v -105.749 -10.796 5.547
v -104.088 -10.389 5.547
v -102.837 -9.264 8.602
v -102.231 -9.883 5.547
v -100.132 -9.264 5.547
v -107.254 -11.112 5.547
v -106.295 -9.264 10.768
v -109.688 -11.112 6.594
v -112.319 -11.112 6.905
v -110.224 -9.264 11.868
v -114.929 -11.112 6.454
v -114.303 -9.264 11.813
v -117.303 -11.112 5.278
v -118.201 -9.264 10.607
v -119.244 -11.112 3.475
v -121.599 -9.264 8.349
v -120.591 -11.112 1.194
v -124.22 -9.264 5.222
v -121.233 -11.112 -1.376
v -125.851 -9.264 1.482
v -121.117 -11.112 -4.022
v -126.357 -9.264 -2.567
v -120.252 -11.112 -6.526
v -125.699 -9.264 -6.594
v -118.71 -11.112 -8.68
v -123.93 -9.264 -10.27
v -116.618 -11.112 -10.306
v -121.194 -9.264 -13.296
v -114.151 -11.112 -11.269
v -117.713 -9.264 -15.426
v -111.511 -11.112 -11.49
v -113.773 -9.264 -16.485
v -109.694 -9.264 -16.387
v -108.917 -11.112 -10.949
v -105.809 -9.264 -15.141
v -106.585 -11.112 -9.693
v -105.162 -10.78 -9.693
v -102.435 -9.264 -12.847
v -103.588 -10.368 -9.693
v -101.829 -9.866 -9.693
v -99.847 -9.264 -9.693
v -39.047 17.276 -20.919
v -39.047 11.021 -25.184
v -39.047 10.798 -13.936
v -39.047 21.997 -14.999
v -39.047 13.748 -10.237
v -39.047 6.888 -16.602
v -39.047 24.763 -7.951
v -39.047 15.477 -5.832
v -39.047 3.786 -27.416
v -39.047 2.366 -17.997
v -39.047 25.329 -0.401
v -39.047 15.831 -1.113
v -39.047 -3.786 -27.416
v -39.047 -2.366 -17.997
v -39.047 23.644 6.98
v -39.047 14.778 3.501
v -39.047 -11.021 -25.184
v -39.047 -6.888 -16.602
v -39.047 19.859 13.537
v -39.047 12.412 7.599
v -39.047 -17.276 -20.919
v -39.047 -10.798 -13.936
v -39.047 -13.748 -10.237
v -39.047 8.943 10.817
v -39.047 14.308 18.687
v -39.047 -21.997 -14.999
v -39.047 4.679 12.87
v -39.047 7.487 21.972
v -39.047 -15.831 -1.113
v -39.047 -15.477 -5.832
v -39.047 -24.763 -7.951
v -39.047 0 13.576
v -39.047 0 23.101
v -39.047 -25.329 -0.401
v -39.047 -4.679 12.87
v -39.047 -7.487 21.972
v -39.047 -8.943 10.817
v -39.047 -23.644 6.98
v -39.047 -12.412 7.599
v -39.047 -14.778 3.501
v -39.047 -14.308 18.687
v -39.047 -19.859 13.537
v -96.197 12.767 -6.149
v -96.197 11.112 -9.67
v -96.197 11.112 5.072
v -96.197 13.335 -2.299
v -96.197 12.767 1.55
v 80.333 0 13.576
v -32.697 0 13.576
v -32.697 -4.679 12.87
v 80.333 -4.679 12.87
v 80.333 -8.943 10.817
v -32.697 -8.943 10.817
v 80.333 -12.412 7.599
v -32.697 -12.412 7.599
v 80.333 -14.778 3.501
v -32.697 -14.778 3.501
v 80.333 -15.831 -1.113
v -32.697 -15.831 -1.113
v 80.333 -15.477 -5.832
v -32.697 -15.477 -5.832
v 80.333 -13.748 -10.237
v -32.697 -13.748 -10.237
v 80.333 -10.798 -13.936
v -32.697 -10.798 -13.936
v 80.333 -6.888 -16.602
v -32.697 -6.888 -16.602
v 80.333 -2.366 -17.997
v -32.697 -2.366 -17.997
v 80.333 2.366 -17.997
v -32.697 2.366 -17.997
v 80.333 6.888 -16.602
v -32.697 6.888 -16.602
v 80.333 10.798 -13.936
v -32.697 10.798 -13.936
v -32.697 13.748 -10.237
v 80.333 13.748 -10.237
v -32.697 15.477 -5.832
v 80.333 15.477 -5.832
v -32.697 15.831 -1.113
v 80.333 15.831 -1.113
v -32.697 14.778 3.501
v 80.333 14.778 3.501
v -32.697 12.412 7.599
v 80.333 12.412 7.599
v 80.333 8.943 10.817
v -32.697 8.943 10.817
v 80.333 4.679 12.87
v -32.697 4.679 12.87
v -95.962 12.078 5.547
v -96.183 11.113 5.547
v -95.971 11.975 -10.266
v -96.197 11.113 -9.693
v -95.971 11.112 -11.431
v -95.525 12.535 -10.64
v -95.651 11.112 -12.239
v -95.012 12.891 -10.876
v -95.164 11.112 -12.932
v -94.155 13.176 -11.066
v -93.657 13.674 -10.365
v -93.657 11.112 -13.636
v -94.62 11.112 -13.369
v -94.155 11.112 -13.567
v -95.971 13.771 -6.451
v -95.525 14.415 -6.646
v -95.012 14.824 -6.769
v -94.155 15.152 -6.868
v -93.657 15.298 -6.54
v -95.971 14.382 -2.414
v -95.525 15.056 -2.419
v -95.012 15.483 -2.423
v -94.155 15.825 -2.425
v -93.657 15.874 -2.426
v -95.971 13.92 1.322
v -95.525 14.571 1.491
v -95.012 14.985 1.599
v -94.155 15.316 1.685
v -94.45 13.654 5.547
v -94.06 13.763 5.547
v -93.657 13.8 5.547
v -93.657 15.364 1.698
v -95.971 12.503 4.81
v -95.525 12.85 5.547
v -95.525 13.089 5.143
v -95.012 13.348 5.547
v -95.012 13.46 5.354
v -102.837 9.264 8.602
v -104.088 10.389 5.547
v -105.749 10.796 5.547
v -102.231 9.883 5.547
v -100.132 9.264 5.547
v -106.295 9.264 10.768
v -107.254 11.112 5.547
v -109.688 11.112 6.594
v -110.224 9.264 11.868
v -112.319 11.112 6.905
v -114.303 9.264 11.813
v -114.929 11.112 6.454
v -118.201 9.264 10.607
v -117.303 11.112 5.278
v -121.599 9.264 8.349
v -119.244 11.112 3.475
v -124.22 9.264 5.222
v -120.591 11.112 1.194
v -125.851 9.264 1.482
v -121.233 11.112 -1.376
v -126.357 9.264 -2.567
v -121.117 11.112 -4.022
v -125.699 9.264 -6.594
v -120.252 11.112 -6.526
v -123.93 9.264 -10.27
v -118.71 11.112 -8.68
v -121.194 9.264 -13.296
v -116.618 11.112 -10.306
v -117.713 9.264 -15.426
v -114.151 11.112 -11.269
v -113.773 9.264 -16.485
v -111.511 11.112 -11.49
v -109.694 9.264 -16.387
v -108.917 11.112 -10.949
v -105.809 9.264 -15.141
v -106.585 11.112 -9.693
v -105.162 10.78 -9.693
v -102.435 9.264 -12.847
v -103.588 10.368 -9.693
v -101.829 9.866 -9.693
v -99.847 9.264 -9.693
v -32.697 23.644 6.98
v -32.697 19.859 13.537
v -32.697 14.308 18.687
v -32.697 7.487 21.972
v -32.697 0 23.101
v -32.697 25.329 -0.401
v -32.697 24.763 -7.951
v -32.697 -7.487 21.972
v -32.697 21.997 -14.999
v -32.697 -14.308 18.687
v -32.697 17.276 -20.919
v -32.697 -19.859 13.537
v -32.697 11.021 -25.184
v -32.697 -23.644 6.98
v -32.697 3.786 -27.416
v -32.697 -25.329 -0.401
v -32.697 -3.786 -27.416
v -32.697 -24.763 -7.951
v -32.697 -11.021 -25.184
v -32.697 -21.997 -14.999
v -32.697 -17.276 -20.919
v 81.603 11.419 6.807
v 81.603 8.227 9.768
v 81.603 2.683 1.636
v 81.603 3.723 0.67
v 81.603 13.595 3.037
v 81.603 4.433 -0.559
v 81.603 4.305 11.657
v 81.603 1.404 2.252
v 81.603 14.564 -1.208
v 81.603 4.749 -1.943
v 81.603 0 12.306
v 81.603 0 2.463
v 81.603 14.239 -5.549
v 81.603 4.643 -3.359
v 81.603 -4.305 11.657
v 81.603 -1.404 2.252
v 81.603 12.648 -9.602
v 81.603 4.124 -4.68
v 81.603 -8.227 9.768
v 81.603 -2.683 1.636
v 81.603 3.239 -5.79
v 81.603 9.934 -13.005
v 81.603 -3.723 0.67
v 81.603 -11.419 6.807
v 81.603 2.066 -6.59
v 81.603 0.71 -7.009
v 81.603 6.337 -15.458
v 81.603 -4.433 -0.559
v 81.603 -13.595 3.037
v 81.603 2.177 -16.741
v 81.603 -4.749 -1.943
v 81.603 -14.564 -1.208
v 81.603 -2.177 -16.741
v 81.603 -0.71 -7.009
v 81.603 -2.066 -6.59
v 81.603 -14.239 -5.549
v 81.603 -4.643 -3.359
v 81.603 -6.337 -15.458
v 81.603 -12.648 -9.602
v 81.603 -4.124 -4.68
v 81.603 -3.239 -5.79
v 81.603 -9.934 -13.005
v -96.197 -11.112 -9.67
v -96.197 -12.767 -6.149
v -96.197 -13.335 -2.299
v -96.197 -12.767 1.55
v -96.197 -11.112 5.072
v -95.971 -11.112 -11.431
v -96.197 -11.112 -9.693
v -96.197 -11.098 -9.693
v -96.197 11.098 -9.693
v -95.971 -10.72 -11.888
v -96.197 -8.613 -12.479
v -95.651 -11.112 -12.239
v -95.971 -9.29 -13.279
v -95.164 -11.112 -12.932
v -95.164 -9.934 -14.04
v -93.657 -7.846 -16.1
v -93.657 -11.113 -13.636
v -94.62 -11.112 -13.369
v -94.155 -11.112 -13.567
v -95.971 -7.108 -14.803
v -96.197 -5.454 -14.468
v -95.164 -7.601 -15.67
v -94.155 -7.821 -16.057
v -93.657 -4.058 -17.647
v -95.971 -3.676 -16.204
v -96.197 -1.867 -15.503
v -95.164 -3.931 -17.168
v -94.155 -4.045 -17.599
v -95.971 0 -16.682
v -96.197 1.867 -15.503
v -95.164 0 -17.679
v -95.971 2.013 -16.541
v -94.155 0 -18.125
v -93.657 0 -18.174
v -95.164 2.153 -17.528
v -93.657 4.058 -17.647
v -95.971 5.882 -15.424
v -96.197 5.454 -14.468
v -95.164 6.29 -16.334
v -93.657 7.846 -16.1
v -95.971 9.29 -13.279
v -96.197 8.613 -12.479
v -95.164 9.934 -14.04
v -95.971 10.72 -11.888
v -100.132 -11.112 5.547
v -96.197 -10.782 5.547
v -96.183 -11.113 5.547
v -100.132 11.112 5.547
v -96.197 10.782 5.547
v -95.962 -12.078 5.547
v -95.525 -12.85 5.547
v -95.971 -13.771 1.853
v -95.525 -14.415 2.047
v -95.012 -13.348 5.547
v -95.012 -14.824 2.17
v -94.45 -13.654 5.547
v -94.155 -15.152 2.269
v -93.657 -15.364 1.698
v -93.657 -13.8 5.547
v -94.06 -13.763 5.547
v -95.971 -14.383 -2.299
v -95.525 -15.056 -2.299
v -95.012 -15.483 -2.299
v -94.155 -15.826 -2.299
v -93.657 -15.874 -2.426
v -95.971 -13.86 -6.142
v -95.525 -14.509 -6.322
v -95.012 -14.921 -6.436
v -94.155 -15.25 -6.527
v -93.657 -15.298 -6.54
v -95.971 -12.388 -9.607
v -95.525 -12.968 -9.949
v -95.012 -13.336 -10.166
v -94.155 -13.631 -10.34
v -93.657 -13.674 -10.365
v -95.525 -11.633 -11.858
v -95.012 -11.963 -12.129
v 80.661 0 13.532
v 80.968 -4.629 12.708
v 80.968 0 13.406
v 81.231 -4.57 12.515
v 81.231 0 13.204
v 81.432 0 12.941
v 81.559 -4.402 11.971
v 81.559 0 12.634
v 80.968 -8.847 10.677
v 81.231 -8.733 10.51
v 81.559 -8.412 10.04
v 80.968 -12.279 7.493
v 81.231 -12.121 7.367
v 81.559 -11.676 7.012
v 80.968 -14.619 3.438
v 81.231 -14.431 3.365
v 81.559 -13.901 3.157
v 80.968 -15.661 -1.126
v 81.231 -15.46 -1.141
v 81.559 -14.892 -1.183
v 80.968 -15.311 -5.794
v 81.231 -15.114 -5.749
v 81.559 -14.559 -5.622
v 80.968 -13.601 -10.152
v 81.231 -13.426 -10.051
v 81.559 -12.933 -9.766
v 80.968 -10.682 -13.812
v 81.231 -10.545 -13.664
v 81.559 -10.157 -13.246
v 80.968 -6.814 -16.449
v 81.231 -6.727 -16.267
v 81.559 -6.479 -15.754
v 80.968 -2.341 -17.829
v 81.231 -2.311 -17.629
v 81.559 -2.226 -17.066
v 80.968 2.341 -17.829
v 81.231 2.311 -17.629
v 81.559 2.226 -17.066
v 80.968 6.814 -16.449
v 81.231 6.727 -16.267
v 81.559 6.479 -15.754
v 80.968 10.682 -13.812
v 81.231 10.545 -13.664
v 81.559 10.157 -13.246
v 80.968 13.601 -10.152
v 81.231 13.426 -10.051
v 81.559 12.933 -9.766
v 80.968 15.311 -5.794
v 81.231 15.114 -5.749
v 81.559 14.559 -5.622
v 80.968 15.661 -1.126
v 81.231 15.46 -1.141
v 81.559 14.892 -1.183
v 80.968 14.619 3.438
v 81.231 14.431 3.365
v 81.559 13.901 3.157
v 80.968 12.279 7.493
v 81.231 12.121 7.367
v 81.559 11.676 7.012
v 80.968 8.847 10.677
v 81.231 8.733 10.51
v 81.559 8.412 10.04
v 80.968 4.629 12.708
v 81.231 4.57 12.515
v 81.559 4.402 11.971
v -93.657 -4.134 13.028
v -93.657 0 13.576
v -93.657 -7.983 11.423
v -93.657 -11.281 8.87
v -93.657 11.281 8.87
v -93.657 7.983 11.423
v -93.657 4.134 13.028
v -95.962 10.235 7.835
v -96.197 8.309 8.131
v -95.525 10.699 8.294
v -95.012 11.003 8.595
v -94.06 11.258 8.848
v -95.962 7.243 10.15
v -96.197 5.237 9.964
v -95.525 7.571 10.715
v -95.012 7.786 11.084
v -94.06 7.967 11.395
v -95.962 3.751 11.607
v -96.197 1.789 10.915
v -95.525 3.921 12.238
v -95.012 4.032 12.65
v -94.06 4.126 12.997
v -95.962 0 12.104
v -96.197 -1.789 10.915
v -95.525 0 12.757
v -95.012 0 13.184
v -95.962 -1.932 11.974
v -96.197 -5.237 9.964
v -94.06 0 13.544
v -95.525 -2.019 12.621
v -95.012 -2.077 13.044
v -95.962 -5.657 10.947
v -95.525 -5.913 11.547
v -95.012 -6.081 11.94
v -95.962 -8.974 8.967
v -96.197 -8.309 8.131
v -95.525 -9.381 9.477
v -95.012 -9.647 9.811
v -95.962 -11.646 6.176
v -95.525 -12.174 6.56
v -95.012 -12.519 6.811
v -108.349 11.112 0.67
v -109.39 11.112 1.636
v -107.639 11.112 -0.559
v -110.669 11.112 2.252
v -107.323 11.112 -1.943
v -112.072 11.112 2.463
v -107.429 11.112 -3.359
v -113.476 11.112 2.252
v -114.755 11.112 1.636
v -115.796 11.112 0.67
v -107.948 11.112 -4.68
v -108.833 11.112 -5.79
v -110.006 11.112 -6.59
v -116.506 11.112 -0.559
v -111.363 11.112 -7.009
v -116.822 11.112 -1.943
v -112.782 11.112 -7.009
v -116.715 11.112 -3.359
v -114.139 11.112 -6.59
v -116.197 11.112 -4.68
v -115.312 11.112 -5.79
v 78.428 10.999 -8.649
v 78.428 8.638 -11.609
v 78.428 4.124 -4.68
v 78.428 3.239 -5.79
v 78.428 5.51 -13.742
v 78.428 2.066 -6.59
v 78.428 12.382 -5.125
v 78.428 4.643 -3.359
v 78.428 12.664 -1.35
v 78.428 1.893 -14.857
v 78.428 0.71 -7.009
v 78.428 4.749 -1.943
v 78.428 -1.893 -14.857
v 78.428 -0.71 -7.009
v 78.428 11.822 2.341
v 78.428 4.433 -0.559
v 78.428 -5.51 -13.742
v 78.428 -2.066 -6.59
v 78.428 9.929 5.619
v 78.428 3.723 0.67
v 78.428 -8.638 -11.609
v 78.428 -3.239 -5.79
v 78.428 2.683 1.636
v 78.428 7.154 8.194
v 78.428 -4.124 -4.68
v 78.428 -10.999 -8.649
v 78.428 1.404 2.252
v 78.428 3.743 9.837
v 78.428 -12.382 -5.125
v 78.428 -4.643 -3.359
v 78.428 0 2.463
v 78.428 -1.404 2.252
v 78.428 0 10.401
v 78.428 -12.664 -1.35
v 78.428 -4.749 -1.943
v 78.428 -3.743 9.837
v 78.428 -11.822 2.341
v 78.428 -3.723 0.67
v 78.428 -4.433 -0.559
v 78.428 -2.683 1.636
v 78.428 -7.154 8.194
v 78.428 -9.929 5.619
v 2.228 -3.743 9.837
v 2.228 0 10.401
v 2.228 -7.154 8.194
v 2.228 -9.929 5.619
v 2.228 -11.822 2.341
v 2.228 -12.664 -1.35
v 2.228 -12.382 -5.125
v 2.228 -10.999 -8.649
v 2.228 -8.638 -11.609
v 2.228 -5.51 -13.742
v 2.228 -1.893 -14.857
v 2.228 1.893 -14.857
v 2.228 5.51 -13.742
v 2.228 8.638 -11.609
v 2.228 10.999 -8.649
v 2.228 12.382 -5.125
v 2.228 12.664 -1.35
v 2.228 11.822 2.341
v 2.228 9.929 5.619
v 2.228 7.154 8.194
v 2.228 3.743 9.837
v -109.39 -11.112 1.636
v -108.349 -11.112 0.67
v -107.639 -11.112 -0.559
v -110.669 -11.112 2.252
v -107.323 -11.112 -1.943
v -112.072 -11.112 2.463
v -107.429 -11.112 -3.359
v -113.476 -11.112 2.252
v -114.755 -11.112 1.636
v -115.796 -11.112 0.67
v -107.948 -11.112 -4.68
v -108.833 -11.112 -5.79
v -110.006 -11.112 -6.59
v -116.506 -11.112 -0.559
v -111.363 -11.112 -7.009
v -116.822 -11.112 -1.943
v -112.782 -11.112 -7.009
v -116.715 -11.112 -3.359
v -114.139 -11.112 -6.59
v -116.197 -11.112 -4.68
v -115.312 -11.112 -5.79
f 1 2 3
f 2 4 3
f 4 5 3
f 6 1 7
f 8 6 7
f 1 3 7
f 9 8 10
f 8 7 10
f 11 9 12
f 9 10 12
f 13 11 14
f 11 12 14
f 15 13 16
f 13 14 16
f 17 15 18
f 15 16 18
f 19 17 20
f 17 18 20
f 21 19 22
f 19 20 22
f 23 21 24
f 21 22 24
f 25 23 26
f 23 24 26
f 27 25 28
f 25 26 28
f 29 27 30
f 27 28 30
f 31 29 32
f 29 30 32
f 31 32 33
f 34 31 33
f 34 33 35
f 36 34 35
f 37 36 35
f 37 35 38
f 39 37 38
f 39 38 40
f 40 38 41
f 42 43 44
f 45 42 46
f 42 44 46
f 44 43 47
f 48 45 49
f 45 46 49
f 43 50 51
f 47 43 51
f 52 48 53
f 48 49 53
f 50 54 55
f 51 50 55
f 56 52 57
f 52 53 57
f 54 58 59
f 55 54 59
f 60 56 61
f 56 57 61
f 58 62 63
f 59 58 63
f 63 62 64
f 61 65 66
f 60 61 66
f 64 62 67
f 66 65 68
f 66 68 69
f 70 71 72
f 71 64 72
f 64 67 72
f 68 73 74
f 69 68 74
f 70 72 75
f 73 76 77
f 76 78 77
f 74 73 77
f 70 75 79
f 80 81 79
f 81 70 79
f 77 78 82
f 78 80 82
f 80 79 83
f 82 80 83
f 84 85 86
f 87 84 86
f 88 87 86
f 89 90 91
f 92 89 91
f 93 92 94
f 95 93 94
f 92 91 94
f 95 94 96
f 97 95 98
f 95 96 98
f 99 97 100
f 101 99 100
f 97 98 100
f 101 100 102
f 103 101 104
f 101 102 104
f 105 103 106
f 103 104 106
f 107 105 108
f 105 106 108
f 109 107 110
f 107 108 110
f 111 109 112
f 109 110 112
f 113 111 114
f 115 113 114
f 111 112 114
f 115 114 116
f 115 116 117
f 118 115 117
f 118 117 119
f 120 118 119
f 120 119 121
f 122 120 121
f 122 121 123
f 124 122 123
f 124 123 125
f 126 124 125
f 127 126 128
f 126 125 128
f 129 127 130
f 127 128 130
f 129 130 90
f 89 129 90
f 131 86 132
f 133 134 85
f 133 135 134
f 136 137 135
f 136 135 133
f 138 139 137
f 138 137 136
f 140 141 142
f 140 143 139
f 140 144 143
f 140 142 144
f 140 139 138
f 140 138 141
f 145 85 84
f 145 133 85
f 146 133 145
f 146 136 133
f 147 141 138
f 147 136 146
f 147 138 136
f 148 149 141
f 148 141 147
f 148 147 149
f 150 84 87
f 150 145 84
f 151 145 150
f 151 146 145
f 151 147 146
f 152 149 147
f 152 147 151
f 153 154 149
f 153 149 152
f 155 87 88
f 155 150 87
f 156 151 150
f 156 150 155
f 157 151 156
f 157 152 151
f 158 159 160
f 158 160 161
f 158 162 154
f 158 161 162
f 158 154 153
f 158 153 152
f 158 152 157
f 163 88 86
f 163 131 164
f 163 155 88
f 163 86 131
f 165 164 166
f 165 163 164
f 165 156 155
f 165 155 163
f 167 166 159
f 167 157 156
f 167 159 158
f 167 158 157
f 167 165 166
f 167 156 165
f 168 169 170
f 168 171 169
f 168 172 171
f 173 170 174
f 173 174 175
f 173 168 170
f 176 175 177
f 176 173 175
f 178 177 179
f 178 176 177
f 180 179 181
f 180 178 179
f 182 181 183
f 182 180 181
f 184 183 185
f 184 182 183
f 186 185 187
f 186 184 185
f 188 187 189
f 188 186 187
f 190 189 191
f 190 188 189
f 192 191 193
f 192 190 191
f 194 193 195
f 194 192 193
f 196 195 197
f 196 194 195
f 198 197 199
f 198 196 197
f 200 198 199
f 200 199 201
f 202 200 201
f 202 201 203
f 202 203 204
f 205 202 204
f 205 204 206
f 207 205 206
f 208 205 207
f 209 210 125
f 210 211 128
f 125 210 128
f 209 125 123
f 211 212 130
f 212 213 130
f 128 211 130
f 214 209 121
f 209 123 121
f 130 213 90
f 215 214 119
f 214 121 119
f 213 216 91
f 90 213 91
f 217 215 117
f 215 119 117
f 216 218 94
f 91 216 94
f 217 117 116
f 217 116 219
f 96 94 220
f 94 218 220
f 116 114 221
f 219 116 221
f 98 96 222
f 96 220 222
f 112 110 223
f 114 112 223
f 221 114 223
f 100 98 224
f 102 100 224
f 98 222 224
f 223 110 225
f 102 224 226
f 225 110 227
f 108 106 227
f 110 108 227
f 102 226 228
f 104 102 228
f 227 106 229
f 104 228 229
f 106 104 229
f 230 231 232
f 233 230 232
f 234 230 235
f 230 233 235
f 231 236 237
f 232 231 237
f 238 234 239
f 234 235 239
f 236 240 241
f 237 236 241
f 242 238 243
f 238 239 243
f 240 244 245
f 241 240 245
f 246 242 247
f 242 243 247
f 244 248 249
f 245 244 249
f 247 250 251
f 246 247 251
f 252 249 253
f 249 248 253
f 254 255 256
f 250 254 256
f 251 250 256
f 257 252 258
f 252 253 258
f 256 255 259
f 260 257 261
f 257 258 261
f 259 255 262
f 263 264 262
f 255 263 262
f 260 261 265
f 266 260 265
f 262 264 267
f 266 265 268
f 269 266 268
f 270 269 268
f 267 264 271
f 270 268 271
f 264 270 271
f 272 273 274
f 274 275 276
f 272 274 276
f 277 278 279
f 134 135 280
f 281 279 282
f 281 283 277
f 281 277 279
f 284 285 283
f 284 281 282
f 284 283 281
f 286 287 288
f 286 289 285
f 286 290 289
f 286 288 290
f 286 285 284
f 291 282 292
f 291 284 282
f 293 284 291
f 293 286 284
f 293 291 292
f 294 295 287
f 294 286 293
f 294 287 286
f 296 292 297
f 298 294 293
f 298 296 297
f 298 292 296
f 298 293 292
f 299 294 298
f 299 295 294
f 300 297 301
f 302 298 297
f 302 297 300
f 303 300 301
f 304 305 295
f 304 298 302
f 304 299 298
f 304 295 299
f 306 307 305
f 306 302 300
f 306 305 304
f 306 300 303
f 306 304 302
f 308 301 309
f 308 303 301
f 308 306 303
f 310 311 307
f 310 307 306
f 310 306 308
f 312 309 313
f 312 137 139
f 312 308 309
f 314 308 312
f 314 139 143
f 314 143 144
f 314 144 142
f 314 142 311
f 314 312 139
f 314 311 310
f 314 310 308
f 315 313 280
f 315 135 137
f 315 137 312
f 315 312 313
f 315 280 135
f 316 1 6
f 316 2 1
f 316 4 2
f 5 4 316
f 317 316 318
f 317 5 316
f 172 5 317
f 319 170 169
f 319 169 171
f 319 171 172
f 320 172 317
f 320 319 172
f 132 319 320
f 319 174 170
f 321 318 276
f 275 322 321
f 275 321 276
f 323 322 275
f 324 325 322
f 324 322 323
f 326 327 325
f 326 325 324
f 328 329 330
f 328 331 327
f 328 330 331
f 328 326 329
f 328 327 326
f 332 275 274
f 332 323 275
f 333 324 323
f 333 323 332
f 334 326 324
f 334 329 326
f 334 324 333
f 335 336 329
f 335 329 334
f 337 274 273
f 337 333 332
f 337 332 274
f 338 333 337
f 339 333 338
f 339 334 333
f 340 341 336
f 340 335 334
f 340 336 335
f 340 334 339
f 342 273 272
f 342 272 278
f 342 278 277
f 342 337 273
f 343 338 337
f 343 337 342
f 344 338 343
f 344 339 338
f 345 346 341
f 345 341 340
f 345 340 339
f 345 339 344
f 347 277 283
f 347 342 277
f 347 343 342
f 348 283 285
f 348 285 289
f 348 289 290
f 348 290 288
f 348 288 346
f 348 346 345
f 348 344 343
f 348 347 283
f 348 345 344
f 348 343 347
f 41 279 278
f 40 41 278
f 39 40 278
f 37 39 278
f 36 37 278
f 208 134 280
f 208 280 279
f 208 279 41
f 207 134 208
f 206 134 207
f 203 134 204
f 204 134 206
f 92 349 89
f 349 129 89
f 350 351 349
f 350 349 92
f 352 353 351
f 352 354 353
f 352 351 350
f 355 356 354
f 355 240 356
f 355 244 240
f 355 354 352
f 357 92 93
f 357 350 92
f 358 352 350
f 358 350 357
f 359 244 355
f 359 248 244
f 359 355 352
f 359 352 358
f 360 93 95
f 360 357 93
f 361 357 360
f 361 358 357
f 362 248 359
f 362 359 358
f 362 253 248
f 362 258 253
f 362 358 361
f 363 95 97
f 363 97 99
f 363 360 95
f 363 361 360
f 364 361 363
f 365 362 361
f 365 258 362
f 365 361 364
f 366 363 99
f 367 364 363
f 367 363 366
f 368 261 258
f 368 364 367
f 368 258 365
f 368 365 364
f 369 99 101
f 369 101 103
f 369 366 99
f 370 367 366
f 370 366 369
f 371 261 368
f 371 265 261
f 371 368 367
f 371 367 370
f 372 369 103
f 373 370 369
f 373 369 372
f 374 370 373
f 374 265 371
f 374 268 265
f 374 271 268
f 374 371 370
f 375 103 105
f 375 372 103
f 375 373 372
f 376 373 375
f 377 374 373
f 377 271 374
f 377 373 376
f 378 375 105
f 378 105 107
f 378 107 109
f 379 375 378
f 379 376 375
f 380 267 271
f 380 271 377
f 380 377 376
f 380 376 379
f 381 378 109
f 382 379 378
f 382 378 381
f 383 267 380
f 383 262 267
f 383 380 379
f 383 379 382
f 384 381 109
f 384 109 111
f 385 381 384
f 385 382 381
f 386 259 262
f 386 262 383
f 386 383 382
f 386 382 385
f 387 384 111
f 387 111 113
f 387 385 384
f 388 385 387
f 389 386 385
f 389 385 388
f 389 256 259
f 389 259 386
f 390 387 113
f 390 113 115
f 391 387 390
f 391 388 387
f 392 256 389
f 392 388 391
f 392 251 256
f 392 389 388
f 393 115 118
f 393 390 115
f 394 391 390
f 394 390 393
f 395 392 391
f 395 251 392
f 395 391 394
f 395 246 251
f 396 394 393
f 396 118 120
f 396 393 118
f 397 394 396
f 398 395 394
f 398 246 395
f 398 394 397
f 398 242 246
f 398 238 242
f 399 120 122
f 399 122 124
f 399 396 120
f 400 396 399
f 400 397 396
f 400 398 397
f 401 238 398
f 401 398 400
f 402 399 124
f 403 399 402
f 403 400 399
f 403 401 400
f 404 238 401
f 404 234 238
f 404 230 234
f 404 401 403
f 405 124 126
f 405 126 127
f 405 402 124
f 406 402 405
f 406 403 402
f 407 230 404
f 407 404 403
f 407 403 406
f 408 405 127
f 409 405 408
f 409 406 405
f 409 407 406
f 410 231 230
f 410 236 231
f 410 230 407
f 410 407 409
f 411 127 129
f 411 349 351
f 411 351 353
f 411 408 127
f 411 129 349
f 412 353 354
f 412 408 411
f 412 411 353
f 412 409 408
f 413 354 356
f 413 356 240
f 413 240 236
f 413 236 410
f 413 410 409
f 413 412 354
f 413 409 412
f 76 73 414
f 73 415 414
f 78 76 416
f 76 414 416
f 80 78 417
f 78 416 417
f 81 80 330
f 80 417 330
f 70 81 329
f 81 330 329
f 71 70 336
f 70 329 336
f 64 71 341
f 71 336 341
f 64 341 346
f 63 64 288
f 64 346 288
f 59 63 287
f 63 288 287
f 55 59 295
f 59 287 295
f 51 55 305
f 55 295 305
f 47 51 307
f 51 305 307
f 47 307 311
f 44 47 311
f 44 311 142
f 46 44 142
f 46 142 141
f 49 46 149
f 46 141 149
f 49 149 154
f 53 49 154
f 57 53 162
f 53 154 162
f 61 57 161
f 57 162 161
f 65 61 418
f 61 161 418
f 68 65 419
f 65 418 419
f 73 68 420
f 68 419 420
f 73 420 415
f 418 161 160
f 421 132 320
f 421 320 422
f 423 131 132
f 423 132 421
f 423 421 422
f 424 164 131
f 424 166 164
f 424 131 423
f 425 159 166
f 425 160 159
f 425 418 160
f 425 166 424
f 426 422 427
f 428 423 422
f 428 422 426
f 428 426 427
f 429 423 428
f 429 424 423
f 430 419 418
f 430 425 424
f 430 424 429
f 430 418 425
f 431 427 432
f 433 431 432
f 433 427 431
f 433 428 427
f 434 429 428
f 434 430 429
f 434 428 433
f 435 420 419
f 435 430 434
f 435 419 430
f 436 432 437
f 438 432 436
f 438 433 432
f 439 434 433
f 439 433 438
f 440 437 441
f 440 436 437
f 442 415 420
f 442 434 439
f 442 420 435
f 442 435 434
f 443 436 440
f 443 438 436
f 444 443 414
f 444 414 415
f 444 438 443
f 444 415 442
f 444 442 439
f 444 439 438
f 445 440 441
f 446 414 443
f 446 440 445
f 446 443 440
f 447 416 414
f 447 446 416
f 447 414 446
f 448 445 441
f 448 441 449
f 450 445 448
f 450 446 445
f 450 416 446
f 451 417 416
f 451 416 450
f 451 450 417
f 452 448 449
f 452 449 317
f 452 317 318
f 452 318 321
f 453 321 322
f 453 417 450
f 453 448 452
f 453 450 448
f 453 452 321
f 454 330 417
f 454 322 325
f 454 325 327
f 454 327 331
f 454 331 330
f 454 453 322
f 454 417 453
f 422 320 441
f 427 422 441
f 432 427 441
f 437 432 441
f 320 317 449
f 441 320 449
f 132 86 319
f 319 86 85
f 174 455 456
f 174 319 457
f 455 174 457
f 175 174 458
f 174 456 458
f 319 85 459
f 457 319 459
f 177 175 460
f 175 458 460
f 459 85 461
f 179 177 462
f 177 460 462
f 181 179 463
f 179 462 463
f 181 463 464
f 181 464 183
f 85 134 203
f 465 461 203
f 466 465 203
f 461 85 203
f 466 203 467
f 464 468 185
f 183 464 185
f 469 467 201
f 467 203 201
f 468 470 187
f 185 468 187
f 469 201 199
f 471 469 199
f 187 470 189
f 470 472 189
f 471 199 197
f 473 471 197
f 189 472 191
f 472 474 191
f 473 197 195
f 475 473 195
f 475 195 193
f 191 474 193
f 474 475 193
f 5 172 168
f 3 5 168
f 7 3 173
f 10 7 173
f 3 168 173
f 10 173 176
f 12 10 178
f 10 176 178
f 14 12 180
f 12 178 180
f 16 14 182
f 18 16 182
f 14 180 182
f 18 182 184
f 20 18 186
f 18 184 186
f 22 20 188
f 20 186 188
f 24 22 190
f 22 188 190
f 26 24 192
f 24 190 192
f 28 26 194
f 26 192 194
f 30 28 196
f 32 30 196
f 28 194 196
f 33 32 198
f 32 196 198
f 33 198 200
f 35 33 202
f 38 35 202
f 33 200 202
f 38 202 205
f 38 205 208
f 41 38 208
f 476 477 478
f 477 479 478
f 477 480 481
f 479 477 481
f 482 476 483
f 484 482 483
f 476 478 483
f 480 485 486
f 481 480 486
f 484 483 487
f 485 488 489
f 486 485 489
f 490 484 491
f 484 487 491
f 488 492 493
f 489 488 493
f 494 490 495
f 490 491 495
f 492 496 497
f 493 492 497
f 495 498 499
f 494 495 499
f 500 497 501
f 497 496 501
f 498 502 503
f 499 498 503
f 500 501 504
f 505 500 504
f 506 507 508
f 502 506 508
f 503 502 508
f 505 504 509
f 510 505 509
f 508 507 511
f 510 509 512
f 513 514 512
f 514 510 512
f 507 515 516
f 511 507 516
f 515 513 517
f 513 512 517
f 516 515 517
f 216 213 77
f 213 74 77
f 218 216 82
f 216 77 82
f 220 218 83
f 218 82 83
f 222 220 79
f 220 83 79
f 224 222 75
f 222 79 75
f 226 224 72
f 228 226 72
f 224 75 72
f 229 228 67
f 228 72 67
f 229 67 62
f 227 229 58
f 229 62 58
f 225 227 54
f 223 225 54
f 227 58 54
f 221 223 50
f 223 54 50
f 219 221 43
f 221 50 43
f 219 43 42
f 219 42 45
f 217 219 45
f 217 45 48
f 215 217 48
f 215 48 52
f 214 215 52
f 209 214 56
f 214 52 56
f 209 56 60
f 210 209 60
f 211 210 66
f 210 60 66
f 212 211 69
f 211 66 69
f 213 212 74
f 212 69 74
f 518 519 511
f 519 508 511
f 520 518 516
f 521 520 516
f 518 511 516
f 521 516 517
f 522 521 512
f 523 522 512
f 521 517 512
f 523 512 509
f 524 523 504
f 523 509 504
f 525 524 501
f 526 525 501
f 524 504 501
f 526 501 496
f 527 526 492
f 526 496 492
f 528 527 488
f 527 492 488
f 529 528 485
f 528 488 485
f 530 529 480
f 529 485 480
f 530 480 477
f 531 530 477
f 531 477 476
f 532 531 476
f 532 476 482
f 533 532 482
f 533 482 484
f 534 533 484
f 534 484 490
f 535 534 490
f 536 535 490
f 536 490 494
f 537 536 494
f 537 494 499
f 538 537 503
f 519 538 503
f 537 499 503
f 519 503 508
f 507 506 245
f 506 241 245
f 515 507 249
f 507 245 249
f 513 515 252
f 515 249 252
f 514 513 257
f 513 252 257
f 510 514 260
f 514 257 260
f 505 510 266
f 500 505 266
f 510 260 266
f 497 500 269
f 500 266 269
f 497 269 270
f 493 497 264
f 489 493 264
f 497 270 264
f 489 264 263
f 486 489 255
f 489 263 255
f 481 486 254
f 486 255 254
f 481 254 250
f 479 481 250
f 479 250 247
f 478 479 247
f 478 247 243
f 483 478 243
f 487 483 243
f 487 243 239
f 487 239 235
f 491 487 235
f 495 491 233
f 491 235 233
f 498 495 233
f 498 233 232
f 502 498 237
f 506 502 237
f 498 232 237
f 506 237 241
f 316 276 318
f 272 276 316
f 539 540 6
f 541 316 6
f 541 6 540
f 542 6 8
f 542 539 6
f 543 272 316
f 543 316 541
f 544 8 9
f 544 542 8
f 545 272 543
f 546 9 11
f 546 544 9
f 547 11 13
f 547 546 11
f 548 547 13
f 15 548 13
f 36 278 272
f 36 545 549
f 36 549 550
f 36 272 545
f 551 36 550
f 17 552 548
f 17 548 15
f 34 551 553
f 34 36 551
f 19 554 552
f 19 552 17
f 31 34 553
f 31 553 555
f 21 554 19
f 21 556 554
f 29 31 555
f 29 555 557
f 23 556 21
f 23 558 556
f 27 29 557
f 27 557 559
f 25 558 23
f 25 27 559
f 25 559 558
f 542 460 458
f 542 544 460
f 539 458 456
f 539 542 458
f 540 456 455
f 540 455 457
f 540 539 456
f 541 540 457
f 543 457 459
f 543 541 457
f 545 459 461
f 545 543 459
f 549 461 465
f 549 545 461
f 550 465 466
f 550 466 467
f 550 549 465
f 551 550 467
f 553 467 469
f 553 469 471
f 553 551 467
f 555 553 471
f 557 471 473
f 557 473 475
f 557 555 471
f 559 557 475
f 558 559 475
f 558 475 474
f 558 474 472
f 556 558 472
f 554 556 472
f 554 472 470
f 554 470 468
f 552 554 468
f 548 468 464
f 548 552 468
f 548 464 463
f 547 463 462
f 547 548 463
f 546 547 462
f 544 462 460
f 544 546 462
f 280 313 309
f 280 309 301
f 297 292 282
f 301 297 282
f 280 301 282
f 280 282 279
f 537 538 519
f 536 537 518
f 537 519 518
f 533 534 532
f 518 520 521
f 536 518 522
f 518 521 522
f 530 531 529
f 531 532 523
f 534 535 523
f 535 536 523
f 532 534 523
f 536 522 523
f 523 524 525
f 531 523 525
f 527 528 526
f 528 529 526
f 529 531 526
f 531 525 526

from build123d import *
from OCP.BRepFilletAPI import BRepFilletAPI_MakeChamfer

# Parameters (mm, degrees)
SKETCH2_R           = 4.7625
BOSS_EXTRUDE1_DEPTH = 11.1125
FILLET1_R           = 2.54
CHAMFER1_SIZE       = 5.08
CHAMFER1_SIZE2      = 1.84896879
FILLET2_R           = 1.27


with BuildPart() as part:
    # Sketch1 → Revolve1 (revolve)
    with BuildSketch(Plane(origin=(0, 0, 0), x_dir=(1, 0, 0), z_dir=(0, 1, 0)), mode=Mode.PRIVATE) as revolve1_sk:
        Polygon((-96.197401359, 18.174240066), (-96.197401359, 2.299240066), (2.227598641, 2.299240066), (2.227598641, 14.999240066), (78.427598641, 14.999240066), (78.427598641, 7.061740066), (81.602598641, 7.061740066), (81.602598641, 18.174240066), (-32.697401359, 18.174240066), (-32.697401359, 27.699240066), (-39.047401359, 27.699240066), (-39.047401359, 18.174240066), align=None)
    revolve(revolve1_sk.sketch.rotate(Axis((-96.197401359, 0, -2.299240066), (1, 0, 0)), 180), axis=Axis((-96.197401359, 0, -2.299240066), (1, 0, 0)))

    # Sketch2 → Boss-Extrude1 (add, symmetric)
    with BuildSketch(Plane(origin=(0, 0, 0), x_dir=(1, 0, 0), z_dir=(0, 1, 0))):
        with BuildLine():
            Line((-99.846730597, 9.692861011), (-96.197401359, 9.692861011))
            Line((-96.197401359, 9.692861011), (-96.197401359, -5.547138989))
            Line((-96.197401359, -5.547138989), (-100.132259318, -5.547138989))
            ThreePointArc((-100.132259318, -5.547138989), (-126.357394433, 2.566876274), (-99.846730597, 9.692861011))
        make_face()
        with Locations(Location((-112.072401359, 2.299240066, 0), (0, 0, 270))):
            Circle(SKETCH2_R, mode=Mode.SUBTRACT)
    extrude(amount=BOSS_EXTRUDE1_DEPTH, both=True)

    # Fillet1
    # the kernel refuses this fillet: 2.54 mm, written as the material it takes off along each edge
    with BuildSketch(Plane(origin=(-96.197401359, 0, -2.299240066), x_dir=(0, 0, 1), z_dir=(0, 1, 0))) as fillet1_piece_1_section:
        with BuildLine():
            CenterArc((15.875 - FILLET1_R, FILLET1_R), FILLET1_R, 270, 90)
            Line((15.875, FILLET1_R), (15.875, 0))
            Line((15.875, 0), (15.875 - FILLET1_R, 0))
        make_face()
    fillet1_piece_1 = revolve(axis=Axis((-96.197401359, 0, -2.299240066), (1, 0, 0)), mode=Mode.PRIVATE)
    fillet1_piece_1 = split(fillet1_piece_1, bisect_by=Plane(origin=(-95.476463438, -6.970916777, 5.547138989), z_dir=(0, 0, 1)), keep=Keep.TOP, mode=Mode.PRIVATE)
    add(fillet1_piece_1, mode=Mode.SUBTRACT)
    with BuildSketch(Plane(origin=(-96.197401359, 0, -2.299240066), x_dir=(0, 0, 1), z_dir=(0, 1, 0))) as fillet1_piece_2_section:
        with BuildLine():
            CenterArc((15.875 - FILLET1_R, FILLET1_R), FILLET1_R, 270, 90)
            Line((15.875, FILLET1_R), (15.875, 0))
            Line((15.875, 0), (15.875 - FILLET1_R, 0))
        make_face()
    fillet1_piece_2 = revolve(axis=Axis((-96.197401359, 0, -2.299240066), (1, 0, 0)), mode=Mode.PRIVATE)
    fillet1_piece_2 = split(fillet1_piece_2, bisect_by=Plane(origin=(-95.473294042, -11.1125, -2.089306166), z_dir=(0, -1, 0)), keep=Keep.TOP, mode=Mode.PRIVATE)
    add(fillet1_piece_2, mode=Mode.SUBTRACT)
    with BuildSketch(Plane(origin=(-96.197401359, 0, -2.299240066), x_dir=(0, 0, 1), z_dir=(0, 1, 0))) as fillet1_piece_3_section:
        with BuildLine():
            CenterArc((15.875 - FILLET1_R, FILLET1_R), FILLET1_R, 270, 90)
            Line((15.875, FILLET1_R), (15.875, 0))
            Line((15.875, 0), (15.875 - FILLET1_R, 0))
        make_face()
    fillet1_piece_3 = revolve(axis=Axis((-96.197401359, 0, -2.299240066), (1, 0, 0)), mode=Mode.PRIVATE)
    fillet1_piece_3 = split(fillet1_piece_3, bisect_by=Plane(origin=(-95.473294037, 11.1125, -2.089306166), z_dir=(0, 1, 0)), keep=Keep.TOP, mode=Mode.PRIVATE)
    add(fillet1_piece_3, mode=Mode.SUBTRACT)
    with BuildSketch(Plane(origin=(-96.197401359, 0, -2.299240066), x_dir=(0, 0, 1), z_dir=(0, 1, 0))) as fillet1_piece_4_section:
        with BuildLine():
            CenterArc((15.875 - FILLET1_R, FILLET1_R), FILLET1_R, 270, 90)
            Line((15.875, FILLET1_R), (15.875, 0))
            Line((15.875, 0), (15.875 - FILLET1_R, 0))
        make_face()
    fillet1_piece_4 = revolve(axis=Axis((-96.197401359, 0, -2.299240066), (1, 0, 0)), mode=Mode.PRIVATE)
    fillet1_piece_4 = split(fillet1_piece_4, bisect_by=Plane(origin=(-95.47646351, 0, -9.692861011), z_dir=(0, 0, -1)), keep=Keep.TOP, mode=Mode.PRIVATE)
    add(fillet1_piece_4, mode=Mode.SUBTRACT)

    # Chamfer1: one chamfer whose edges measure the first distance from different faces: ONE call of the kernel's chamfer builder (chamfer() names one face for all edges)
    chamfer1_edges_1 = [part.edges().sort_by_distance(p)[0] for p in [
        (-126.357394433, 11.1125, -2.566876274),
    ]]
    chamfer1_side_1 = [part.faces().sort_by_distance(p)[0] for p in [
        (-125.941875569, 11.1125, -2.559091328),
    ]]
    chamfer1_edges_2 = [part.edges().sort_by_distance(p)[0] for p in [
        (-126.357394433, -11.1125, -2.566876274),
    ]]
    chamfer1_side_2 = [part.faces().sort_by_distance(p)[0] for p in [
        (-125.941875569, -11.1125, -2.559091328),
    ]]
    chamfer1 = BRepFilletAPI_MakeChamfer(part.part.solid().wrapped)
    for e in chamfer1_edges_1:
        chamfer1.Add(CHAMFER1_SIZE, CHAMFER1_SIZE2, e.wrapped, chamfer1_side_1[0].wrapped)  # the first distance lies on this face
    for e in chamfer1_edges_2:
        chamfer1.Add(CHAMFER1_SIZE, CHAMFER1_SIZE2, e.wrapped, chamfer1_side_2[0].wrapped)  # the first distance lies on this face
    add(Compound.cast(chamfer1.Shape()), mode=Mode.REPLACE)

    # Fillet2
    fillet2_edges = [part.edges().sort_by_distance(p)[0] for p in [
        (81.602598641, 0, -18.174240066),
    ]]
    fillet(fillet2_edges, radius=FILLET2_R)


solid = part.part
